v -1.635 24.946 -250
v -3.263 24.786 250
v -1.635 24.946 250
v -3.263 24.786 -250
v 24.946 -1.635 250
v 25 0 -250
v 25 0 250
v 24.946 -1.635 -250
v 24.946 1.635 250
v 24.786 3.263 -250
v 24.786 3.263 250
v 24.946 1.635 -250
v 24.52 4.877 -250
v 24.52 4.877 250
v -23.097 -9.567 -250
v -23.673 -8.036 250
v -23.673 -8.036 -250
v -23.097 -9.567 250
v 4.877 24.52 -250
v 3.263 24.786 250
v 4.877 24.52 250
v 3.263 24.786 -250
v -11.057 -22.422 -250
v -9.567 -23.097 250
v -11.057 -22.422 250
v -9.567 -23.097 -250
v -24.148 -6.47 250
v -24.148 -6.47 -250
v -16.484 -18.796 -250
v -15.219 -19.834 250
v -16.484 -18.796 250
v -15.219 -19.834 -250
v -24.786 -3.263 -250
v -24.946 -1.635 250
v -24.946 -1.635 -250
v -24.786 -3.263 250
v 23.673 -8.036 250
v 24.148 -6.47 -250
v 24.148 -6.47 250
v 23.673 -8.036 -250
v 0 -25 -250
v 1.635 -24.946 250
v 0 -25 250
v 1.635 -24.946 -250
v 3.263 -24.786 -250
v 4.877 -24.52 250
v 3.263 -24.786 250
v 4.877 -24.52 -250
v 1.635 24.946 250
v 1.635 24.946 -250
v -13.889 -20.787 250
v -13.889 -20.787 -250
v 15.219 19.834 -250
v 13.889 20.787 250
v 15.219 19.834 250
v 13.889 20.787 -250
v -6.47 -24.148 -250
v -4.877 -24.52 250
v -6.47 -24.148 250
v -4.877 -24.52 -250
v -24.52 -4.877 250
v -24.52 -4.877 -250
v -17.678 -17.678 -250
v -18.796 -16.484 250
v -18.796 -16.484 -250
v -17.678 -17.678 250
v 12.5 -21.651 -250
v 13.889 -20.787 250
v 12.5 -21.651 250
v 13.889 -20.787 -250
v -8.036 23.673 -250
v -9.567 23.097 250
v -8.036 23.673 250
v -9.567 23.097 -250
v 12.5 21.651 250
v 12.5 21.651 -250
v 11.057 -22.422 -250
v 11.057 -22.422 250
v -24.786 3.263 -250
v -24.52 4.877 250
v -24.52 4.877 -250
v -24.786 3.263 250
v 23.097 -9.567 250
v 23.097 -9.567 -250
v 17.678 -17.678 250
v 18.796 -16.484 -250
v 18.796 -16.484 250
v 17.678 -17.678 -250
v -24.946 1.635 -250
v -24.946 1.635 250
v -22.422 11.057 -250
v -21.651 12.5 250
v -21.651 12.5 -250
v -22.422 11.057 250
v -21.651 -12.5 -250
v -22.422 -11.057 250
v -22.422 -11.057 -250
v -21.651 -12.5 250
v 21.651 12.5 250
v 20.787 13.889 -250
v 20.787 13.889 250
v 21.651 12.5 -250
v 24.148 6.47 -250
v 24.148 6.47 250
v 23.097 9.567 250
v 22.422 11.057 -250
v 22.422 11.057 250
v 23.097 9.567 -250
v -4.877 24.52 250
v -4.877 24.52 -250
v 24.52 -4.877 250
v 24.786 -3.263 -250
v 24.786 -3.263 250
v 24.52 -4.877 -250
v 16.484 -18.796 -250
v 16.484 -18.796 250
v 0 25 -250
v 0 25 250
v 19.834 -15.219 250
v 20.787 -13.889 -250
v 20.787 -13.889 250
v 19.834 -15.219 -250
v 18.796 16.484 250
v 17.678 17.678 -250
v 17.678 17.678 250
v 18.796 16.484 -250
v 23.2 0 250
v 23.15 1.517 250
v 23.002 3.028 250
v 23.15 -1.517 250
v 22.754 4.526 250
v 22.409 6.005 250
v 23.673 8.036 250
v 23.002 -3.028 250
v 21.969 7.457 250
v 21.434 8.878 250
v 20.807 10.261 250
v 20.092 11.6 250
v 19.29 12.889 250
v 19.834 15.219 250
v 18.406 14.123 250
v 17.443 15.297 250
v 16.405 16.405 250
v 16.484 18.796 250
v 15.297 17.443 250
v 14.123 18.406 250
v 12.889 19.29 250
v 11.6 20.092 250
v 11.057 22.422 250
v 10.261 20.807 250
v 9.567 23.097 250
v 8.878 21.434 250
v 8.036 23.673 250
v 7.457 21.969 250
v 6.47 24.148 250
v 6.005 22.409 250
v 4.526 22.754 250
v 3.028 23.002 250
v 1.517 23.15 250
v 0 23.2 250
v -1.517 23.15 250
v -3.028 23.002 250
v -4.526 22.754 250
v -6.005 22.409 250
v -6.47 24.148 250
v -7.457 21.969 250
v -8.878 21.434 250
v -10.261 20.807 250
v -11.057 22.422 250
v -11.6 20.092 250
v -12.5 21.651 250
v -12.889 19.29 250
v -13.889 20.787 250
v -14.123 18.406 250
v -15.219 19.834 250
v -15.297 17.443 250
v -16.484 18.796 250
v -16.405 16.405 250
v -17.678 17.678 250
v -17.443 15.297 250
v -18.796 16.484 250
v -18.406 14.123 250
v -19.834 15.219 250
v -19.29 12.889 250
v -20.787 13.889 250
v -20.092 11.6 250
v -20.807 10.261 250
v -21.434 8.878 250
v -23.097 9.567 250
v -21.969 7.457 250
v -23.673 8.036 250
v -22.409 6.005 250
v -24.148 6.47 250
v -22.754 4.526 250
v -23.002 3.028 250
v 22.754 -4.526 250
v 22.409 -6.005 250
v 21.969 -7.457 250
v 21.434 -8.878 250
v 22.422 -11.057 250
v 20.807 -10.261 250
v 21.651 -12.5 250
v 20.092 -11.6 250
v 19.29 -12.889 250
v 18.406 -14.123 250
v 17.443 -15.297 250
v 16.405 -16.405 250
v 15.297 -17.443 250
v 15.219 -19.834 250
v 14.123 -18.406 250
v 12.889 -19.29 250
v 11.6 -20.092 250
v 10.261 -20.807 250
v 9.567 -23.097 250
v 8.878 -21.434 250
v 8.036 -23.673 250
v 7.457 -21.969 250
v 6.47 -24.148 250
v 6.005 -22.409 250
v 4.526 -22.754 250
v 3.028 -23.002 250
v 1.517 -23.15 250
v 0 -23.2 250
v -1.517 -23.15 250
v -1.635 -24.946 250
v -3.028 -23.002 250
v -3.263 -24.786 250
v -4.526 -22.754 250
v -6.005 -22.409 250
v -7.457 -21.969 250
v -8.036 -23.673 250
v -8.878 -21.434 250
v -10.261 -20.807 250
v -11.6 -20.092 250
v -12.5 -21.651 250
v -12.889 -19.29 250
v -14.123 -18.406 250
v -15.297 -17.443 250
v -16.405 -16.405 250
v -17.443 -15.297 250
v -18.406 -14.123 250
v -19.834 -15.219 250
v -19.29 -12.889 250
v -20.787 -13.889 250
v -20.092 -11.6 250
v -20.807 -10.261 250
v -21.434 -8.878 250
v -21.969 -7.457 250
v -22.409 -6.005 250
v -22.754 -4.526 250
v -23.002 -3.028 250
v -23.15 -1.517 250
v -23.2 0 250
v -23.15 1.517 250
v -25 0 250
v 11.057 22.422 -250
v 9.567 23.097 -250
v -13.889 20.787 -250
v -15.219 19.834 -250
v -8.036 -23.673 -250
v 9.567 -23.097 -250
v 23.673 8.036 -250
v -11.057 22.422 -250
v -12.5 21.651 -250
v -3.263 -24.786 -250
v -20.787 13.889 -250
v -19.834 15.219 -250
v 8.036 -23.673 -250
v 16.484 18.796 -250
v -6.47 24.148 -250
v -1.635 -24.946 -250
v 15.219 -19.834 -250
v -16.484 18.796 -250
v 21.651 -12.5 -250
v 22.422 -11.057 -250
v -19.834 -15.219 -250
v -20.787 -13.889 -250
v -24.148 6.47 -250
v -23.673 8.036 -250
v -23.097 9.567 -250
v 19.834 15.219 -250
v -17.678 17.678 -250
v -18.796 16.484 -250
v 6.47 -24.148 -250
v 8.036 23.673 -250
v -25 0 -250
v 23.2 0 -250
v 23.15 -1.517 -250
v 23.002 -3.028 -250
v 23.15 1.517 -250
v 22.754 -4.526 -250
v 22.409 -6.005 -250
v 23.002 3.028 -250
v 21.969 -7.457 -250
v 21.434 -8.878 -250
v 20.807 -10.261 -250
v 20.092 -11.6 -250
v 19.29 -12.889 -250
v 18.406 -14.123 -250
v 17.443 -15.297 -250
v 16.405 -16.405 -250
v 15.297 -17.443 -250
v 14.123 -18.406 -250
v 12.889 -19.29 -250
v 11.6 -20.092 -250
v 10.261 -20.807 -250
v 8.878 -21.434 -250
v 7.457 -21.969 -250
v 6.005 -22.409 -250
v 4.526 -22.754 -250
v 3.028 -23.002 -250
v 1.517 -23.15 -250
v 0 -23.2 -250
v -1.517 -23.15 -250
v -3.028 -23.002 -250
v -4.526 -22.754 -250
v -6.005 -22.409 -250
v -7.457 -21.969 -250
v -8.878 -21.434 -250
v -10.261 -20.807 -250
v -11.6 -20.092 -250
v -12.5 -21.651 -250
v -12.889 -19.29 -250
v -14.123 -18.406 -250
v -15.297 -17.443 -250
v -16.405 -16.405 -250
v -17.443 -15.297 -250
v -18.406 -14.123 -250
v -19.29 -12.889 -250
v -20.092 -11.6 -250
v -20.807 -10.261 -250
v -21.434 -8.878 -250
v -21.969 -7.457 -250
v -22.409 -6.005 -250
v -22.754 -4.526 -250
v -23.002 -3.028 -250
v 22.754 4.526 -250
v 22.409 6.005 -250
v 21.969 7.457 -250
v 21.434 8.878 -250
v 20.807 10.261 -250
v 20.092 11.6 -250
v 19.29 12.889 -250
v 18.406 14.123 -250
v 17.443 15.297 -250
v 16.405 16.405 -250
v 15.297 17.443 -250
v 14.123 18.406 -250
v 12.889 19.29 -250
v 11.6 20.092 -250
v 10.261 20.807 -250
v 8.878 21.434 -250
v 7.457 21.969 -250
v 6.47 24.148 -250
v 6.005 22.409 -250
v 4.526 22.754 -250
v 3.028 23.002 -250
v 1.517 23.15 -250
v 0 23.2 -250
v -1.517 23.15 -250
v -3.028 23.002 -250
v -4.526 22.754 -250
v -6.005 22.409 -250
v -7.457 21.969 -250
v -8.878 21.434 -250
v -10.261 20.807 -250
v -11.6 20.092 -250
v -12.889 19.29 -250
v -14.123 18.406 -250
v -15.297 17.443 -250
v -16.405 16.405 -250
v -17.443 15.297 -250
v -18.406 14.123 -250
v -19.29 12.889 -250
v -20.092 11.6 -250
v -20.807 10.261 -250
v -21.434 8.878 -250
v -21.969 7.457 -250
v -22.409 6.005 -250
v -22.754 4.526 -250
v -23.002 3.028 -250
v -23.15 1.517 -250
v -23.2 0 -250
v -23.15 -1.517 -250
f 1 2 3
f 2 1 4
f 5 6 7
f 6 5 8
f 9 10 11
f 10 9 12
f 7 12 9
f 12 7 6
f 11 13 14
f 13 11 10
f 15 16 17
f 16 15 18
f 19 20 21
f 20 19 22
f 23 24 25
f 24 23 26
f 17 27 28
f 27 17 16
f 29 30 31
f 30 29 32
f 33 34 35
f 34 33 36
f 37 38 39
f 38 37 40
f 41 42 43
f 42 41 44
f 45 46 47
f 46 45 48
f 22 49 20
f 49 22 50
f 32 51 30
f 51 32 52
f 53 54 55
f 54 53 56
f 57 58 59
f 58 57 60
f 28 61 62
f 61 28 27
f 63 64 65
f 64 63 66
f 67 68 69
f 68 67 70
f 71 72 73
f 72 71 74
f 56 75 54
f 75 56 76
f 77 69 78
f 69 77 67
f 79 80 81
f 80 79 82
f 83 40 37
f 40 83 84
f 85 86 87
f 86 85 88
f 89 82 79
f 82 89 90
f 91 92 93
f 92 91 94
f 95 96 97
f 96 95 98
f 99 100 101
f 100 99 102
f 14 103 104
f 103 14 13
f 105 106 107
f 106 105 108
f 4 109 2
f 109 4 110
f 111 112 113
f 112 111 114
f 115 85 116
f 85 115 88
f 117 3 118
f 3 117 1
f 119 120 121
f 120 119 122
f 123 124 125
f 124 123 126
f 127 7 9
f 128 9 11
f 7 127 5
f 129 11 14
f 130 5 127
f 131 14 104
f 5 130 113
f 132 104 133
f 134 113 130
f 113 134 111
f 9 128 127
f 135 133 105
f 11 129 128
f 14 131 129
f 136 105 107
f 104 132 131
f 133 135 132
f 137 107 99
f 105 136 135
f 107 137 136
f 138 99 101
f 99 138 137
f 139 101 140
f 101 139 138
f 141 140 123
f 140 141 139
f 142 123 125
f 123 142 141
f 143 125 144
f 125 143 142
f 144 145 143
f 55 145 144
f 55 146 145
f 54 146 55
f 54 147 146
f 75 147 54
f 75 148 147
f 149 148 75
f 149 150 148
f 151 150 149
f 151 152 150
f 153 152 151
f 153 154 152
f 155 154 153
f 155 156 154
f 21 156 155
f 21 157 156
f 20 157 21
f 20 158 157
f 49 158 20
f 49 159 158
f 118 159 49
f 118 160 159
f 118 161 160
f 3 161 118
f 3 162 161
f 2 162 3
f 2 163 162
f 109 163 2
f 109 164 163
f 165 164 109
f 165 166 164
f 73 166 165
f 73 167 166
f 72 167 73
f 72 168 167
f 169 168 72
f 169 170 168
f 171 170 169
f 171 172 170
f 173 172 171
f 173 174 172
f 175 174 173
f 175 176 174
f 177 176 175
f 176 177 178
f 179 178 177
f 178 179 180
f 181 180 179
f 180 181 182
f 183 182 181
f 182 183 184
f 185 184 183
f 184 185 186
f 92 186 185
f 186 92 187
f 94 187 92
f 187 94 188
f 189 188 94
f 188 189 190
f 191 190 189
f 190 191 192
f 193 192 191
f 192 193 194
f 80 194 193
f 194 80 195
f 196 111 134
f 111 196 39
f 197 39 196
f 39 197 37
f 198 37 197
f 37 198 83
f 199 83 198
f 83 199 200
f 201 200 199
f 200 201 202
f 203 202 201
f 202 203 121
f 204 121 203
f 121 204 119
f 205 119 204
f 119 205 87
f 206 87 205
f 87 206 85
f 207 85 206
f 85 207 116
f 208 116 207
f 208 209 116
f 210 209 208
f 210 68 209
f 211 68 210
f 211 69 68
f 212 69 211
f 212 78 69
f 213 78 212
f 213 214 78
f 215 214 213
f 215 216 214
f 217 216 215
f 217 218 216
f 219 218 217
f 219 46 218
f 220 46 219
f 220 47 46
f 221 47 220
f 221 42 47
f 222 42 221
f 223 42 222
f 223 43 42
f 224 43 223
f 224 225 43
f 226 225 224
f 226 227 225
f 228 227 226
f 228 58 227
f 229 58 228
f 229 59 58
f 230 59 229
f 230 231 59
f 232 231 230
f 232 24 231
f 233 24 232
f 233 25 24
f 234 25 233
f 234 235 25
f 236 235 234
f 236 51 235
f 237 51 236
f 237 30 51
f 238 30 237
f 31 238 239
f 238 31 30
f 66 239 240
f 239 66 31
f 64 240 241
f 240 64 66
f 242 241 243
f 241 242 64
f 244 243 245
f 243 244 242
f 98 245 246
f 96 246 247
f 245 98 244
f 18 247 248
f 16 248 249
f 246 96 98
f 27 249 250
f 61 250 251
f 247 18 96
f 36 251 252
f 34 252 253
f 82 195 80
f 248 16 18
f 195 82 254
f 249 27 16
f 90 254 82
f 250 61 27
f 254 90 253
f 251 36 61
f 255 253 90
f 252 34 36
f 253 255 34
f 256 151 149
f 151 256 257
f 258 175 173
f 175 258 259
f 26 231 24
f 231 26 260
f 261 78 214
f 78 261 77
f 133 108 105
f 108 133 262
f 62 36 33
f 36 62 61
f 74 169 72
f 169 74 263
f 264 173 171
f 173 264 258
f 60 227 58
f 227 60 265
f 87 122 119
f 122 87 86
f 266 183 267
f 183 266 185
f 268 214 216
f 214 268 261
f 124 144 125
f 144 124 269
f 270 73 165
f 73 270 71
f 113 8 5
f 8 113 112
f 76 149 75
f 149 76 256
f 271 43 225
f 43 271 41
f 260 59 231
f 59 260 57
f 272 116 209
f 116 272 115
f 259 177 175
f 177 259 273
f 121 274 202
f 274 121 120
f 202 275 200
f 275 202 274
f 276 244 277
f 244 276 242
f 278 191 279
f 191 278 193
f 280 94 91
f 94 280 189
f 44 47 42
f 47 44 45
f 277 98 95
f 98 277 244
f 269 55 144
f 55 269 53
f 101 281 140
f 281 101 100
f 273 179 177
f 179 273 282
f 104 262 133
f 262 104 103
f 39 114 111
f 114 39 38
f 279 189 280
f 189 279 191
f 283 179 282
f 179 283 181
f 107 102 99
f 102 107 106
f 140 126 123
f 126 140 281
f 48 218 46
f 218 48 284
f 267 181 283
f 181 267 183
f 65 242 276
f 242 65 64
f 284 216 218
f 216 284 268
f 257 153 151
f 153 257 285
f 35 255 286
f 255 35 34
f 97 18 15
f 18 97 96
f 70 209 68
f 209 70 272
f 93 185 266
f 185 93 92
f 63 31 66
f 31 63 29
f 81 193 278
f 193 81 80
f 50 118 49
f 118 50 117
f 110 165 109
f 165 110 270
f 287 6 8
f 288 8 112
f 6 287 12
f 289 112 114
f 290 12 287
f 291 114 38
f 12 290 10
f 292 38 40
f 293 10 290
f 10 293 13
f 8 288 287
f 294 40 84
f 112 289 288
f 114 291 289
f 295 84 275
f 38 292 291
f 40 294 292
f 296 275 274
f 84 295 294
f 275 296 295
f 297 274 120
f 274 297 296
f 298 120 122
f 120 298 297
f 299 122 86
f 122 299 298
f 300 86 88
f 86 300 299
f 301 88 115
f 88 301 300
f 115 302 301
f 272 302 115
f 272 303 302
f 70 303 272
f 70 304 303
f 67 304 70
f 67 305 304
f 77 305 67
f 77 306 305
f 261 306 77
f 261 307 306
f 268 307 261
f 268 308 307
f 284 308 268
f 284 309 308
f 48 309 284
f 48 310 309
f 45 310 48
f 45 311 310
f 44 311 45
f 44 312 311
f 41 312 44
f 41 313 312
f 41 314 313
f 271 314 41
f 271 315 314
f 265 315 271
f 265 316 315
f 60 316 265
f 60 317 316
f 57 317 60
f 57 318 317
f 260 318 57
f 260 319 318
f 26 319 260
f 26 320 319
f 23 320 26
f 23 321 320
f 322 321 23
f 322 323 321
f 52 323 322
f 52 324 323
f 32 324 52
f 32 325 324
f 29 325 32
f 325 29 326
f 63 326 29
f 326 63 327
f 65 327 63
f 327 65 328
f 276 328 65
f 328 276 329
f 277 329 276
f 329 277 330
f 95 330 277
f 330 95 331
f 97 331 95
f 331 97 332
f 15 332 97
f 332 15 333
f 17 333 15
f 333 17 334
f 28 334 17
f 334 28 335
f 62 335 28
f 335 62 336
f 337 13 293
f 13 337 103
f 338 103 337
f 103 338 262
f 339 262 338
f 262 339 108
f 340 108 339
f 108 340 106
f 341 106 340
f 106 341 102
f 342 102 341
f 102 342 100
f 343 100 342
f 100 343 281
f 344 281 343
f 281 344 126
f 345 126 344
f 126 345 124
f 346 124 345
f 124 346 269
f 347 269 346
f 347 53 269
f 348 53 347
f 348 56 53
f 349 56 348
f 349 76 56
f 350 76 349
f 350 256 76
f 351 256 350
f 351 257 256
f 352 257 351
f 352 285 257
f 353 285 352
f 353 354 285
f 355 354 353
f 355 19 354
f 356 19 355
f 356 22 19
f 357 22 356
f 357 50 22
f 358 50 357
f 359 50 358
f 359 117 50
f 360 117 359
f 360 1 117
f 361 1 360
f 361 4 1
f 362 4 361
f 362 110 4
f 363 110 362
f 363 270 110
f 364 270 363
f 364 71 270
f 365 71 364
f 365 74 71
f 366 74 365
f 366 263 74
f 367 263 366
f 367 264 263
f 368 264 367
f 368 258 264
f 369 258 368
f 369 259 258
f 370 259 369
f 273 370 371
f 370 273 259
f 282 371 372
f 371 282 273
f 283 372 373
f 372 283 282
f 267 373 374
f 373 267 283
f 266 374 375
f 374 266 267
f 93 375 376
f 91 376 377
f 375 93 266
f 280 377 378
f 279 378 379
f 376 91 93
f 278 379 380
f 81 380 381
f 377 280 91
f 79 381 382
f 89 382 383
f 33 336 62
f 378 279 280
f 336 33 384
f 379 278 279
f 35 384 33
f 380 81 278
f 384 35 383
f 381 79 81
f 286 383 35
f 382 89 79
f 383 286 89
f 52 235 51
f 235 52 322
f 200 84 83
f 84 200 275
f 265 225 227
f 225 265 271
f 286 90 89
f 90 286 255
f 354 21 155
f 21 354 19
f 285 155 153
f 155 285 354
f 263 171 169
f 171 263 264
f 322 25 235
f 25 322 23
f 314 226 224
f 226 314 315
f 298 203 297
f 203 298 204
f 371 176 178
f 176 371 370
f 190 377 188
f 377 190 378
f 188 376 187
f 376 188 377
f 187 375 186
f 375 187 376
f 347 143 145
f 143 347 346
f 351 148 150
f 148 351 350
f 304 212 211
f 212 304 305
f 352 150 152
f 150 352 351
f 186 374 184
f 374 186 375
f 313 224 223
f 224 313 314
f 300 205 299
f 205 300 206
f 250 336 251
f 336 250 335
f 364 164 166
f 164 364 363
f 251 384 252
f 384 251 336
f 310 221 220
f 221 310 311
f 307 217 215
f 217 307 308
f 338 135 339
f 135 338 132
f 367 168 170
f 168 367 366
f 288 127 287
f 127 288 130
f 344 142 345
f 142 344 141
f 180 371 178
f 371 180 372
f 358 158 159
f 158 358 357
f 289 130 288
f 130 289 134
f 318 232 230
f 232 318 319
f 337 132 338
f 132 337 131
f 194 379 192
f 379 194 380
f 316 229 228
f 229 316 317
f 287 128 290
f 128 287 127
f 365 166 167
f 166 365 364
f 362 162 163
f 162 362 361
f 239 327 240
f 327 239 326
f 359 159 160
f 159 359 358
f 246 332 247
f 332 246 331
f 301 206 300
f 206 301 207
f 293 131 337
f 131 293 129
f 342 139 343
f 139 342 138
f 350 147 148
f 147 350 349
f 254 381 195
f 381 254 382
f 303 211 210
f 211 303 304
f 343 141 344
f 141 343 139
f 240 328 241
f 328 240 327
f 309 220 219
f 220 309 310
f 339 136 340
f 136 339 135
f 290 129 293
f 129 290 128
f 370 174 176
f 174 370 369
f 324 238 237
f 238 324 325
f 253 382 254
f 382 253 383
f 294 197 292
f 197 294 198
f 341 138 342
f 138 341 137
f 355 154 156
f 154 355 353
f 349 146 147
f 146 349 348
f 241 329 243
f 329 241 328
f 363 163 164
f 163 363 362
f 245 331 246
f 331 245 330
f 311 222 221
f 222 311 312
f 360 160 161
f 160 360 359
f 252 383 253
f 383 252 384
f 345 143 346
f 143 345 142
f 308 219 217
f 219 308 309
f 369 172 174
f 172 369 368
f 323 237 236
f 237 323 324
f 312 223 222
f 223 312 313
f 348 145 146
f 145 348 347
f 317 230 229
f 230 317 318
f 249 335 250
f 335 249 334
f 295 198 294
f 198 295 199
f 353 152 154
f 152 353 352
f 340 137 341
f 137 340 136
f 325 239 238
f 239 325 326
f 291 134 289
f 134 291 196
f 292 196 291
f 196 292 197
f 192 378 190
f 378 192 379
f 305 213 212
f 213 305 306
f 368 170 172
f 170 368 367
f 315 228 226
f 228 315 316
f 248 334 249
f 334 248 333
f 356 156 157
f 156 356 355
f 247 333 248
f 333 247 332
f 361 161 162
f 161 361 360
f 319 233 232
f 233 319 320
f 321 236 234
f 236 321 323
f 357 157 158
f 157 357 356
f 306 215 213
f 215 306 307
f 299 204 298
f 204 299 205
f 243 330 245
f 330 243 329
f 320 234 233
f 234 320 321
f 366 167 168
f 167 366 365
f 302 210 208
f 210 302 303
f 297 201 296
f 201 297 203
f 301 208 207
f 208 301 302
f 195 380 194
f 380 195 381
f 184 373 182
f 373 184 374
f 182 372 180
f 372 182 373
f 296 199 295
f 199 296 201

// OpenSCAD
$fn=96;

module ht_pipe(od=50, wall=1.8, length=500) {
    difference() {
        translate([0,0,-length/2])
            cylinder(h=length, d=od);
        translate([0,0,-length/2-0.1])
            cylinder(h=length+0.2, d=od-2*wall);
    }
}

ht_pipe(od=50, wall=1.8, length=500);
